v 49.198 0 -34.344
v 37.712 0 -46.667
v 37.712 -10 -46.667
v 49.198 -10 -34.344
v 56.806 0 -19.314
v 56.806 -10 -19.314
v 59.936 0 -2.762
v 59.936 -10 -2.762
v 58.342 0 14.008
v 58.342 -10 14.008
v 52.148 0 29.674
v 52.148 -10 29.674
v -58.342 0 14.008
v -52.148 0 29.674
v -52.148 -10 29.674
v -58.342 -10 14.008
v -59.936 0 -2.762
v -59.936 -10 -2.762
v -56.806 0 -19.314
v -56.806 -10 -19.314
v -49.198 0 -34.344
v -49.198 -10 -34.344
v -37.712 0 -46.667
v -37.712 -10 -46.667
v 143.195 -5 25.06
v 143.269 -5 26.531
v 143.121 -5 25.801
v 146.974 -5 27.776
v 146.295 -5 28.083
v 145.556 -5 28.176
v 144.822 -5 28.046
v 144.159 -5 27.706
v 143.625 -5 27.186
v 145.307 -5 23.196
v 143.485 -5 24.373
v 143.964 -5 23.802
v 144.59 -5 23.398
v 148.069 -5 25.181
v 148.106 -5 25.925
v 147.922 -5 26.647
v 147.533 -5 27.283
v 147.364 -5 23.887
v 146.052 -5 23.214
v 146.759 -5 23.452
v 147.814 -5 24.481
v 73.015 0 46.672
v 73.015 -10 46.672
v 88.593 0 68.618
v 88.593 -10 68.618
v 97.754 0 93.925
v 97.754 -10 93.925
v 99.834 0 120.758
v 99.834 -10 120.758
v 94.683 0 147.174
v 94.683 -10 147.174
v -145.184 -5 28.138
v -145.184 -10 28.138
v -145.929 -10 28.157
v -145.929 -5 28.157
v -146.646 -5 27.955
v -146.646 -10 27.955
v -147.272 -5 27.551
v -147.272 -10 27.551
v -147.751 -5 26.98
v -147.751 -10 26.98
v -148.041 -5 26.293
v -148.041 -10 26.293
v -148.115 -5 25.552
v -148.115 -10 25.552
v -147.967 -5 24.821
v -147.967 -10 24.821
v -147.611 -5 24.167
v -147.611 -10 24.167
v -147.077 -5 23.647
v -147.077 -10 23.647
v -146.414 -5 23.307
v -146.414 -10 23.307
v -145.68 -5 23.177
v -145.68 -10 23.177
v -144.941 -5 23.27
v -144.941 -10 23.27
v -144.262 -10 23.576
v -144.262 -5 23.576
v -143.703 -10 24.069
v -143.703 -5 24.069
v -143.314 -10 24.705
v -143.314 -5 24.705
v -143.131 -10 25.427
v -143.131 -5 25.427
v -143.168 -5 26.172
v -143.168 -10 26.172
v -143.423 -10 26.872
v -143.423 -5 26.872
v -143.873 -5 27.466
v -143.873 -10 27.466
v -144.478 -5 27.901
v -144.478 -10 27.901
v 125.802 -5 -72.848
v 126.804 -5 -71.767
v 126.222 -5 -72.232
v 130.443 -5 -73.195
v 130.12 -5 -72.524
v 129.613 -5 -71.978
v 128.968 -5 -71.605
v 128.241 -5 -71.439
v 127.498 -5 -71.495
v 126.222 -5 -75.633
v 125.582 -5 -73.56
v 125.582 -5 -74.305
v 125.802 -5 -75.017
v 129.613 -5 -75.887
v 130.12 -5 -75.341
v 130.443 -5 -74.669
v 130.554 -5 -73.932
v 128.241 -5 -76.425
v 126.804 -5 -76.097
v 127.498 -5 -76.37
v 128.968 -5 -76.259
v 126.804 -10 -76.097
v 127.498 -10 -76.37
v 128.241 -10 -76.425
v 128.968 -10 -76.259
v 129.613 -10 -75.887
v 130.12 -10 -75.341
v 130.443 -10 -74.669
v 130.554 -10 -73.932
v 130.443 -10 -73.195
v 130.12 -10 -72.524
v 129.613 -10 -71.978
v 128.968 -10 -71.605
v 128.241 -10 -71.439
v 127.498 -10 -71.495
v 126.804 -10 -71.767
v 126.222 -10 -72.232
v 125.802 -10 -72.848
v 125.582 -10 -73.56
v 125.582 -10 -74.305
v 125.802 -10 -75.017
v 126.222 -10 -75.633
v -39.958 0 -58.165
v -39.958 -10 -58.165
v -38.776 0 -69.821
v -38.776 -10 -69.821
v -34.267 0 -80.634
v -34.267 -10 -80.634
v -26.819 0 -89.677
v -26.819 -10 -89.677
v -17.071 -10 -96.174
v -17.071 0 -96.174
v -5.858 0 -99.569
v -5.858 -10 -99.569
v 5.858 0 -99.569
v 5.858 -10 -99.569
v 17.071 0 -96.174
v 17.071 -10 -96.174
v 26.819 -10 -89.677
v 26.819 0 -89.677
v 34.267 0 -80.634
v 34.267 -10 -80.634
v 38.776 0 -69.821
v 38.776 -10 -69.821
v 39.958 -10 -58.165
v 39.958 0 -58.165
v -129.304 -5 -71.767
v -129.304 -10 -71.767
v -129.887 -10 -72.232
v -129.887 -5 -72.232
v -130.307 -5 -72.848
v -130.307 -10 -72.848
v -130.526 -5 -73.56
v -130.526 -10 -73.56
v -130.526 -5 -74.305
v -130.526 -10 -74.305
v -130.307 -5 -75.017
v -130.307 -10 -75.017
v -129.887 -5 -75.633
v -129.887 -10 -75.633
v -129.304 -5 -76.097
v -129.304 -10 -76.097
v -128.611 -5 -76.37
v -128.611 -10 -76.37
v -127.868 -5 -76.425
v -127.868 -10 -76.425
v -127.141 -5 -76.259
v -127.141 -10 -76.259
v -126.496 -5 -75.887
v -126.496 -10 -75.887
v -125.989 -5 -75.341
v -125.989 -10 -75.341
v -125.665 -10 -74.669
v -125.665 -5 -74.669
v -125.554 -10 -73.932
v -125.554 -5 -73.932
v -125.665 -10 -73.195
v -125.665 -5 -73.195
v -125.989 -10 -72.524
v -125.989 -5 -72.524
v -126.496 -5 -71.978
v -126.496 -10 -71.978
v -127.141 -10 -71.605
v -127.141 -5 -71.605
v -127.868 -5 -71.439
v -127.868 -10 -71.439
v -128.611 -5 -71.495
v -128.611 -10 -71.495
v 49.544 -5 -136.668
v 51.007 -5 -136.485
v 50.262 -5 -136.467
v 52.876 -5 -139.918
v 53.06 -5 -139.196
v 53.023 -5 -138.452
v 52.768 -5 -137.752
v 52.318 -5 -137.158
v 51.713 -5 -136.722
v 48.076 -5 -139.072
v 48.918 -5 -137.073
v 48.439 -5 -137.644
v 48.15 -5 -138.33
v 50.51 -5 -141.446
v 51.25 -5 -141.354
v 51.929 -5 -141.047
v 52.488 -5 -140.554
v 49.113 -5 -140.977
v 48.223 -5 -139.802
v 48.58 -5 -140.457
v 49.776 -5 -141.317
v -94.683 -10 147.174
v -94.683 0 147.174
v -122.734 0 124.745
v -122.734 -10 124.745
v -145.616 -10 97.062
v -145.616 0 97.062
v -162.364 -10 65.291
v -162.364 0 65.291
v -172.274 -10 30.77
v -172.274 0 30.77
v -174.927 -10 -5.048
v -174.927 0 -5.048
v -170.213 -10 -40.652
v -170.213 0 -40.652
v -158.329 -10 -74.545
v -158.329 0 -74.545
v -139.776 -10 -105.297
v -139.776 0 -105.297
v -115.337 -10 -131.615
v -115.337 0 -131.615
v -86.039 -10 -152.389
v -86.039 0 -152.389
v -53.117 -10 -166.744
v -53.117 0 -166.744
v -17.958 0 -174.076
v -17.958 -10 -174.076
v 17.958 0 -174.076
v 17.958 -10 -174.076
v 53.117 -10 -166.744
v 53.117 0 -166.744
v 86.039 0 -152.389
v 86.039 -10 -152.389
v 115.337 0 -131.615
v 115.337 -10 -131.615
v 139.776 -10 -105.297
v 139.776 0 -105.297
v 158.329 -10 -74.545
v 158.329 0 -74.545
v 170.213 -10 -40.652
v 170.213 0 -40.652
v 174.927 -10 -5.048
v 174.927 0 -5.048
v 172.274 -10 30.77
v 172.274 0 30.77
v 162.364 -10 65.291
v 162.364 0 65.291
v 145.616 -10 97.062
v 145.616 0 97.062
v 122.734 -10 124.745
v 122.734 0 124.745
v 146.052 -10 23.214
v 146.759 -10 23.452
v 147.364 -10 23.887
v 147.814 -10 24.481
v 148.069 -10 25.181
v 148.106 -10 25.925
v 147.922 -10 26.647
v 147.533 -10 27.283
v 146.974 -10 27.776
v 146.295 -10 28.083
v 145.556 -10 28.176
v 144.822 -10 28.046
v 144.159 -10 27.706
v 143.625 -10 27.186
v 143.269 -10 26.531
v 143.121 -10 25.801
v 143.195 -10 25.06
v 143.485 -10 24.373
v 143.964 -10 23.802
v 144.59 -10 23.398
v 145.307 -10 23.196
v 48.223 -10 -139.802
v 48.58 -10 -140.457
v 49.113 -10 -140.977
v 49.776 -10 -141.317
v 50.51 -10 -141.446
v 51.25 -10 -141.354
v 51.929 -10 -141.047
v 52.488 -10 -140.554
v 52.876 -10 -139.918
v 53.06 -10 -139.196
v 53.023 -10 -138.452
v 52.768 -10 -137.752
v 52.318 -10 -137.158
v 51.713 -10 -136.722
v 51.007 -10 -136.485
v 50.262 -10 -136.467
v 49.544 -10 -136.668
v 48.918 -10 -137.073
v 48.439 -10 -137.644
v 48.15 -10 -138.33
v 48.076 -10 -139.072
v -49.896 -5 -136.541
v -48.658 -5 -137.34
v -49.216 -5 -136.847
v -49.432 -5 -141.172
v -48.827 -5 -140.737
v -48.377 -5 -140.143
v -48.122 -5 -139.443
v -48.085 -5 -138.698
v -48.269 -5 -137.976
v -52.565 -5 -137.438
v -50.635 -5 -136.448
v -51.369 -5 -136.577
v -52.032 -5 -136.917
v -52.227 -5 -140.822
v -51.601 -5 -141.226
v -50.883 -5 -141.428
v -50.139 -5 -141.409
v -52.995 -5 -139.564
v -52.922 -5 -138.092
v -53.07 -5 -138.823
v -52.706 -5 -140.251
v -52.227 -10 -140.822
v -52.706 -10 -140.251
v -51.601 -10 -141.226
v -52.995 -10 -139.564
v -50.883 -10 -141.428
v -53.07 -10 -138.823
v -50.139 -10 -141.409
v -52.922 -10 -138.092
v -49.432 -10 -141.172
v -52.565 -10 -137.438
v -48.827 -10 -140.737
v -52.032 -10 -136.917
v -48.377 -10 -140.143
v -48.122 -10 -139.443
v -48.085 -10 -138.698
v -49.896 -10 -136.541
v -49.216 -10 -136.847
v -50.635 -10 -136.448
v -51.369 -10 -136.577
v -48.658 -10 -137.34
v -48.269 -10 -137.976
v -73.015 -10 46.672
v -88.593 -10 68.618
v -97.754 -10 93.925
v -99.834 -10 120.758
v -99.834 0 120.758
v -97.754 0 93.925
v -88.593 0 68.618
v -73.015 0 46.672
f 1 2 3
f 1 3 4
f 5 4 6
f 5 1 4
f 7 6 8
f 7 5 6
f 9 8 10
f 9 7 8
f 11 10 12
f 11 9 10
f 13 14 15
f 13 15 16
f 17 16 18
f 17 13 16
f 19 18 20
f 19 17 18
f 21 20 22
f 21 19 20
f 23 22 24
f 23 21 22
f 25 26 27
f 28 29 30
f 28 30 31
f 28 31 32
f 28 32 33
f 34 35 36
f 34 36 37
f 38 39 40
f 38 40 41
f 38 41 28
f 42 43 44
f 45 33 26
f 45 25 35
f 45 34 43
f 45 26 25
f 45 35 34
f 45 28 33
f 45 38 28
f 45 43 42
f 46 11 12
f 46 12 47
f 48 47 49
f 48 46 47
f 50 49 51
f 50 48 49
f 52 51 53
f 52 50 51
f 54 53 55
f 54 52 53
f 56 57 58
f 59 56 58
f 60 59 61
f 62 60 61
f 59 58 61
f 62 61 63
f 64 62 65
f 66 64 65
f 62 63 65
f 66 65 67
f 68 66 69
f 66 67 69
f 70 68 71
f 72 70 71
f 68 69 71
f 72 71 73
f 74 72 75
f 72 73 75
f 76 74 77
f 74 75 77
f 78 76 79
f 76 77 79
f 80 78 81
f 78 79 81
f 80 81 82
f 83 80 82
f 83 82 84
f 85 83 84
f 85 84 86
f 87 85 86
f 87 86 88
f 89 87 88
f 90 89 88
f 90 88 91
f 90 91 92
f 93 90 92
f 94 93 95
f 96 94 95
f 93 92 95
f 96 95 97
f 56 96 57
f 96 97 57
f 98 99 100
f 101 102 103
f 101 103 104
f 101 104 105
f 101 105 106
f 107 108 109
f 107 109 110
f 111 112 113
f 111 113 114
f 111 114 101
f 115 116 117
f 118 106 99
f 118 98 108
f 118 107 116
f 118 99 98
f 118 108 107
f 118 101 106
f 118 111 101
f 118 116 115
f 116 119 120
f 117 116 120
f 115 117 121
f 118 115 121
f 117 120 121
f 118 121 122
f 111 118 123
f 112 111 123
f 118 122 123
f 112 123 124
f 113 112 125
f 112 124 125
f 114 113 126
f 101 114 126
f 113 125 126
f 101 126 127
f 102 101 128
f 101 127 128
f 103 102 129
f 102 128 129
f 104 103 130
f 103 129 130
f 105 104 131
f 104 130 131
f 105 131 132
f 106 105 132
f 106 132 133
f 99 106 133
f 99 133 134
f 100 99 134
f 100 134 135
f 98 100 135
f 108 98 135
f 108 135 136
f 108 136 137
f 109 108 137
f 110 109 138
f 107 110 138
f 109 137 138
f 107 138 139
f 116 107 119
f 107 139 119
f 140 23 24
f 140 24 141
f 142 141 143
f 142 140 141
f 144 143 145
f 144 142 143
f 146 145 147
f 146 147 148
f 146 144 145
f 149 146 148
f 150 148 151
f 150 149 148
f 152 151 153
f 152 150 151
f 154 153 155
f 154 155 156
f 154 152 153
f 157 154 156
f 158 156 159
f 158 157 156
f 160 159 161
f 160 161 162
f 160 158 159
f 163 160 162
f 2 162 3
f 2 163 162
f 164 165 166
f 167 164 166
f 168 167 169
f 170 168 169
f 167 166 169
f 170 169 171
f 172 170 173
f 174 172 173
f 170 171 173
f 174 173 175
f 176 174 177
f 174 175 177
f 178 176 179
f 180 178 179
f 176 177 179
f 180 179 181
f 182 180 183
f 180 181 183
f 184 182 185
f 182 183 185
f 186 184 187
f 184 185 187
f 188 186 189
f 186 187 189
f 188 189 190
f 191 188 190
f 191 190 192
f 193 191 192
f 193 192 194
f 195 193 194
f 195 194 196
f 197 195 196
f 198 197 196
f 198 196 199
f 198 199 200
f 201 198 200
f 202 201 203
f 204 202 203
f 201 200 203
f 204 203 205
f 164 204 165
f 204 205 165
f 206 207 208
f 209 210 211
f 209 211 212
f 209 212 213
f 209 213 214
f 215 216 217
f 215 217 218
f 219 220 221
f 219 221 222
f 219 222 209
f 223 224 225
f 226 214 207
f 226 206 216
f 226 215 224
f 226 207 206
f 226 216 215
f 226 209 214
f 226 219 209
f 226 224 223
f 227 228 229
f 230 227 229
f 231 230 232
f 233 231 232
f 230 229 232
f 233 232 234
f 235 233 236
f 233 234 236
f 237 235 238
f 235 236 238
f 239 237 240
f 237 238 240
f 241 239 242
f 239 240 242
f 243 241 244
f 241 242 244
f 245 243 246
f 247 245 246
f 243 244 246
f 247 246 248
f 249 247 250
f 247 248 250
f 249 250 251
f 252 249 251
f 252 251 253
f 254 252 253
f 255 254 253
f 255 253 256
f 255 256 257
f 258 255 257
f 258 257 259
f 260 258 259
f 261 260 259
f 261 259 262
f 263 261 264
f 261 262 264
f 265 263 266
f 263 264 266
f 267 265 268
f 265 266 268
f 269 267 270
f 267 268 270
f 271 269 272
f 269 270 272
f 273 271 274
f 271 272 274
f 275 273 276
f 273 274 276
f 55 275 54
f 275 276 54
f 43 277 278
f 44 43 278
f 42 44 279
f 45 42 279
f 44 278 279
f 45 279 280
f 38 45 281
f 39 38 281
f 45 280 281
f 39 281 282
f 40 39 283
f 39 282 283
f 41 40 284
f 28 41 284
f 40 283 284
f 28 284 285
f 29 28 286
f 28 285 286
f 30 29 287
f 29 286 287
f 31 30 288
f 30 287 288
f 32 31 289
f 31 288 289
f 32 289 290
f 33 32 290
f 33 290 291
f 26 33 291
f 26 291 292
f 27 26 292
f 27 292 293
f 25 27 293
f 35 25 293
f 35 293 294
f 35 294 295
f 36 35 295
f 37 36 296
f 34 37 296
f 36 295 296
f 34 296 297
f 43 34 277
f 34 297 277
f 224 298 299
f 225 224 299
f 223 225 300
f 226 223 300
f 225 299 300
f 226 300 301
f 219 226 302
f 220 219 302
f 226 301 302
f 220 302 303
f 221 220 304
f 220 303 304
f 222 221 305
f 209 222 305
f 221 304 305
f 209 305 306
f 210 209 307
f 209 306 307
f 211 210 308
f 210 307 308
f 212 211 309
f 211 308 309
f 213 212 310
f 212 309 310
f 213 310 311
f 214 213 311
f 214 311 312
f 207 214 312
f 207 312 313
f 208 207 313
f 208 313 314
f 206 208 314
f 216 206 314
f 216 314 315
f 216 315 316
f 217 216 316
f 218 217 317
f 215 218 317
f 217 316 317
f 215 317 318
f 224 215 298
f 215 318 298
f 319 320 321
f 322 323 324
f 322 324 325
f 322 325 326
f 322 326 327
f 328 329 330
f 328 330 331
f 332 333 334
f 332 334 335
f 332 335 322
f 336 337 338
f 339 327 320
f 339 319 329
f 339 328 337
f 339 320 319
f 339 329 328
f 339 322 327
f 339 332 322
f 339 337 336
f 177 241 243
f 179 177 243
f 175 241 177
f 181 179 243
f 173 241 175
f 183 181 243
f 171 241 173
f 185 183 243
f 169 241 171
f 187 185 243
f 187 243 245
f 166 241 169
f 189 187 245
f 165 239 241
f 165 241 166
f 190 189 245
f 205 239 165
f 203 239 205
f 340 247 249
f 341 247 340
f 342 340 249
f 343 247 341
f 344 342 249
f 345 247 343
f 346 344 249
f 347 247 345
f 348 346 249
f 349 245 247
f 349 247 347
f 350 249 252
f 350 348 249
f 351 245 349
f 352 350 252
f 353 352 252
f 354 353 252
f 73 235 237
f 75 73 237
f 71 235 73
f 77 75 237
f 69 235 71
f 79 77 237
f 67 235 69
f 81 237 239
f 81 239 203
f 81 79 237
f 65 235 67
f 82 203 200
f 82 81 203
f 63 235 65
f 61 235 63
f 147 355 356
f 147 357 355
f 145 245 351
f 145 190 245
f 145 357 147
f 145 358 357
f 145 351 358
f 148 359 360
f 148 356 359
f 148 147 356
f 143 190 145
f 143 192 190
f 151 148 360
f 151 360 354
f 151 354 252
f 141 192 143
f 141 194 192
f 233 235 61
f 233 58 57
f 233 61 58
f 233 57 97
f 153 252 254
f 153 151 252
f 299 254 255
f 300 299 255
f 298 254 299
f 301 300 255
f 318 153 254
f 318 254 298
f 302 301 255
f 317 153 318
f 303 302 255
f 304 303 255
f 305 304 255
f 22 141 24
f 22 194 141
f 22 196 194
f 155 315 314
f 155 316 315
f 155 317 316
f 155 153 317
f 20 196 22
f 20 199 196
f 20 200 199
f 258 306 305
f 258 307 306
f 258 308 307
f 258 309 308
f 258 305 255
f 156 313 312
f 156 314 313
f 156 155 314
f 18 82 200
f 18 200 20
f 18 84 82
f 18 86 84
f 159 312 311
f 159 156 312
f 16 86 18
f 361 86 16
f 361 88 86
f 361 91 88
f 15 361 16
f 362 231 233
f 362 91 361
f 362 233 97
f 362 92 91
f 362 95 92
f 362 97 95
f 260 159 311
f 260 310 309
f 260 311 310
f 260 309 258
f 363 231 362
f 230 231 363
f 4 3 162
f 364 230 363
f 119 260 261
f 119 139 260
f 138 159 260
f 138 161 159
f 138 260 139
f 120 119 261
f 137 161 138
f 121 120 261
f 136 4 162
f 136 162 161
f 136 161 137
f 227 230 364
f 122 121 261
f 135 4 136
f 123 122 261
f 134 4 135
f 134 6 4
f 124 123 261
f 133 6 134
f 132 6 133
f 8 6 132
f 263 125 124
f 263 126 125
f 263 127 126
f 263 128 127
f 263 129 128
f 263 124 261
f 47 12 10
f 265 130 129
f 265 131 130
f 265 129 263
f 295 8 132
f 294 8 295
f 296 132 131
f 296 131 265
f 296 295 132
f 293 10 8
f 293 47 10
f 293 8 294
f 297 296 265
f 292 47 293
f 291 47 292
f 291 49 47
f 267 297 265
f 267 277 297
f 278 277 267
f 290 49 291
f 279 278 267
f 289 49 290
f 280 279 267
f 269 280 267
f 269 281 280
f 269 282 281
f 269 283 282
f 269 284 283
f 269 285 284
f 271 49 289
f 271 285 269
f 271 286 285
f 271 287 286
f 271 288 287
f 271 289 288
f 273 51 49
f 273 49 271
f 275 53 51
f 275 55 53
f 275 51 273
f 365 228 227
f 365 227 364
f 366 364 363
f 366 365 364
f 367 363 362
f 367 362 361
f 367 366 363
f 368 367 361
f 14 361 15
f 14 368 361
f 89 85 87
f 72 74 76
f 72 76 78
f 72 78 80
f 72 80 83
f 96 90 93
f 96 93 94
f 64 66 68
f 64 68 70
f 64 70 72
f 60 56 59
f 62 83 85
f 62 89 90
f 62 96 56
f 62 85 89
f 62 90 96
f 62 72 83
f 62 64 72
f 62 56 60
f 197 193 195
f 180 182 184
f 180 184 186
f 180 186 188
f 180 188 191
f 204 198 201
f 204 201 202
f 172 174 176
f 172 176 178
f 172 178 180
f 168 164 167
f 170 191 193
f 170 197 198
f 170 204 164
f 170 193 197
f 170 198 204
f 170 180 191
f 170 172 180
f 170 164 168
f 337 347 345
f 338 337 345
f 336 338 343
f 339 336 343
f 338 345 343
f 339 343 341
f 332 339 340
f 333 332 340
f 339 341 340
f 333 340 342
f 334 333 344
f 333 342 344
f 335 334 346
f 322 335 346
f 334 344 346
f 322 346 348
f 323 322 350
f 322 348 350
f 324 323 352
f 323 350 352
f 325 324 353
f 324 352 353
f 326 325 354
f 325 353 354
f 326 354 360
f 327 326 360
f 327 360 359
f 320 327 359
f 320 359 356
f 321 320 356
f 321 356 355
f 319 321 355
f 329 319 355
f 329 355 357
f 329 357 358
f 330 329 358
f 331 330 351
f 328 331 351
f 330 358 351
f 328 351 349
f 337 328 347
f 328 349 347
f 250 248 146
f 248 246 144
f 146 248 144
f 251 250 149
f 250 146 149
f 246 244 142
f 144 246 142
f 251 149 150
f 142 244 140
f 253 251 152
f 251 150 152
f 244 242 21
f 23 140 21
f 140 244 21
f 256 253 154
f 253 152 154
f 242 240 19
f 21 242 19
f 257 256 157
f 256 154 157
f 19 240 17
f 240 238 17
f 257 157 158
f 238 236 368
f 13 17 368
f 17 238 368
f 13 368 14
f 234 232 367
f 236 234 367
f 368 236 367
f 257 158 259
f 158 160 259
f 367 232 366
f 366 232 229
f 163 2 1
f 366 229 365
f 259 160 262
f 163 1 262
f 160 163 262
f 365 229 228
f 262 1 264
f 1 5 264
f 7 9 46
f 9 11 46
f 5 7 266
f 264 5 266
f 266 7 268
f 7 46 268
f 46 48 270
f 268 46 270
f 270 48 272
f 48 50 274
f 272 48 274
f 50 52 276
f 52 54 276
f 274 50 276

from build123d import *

# Parameters (mm, degrees)
PAD_DEPTH          = 10
SKETCH001_R        = 2.5
POCKET_DEPTH       = 5
POLARPATTERN_COUNT = 9


with BuildPart() as part:
    # Sketch → Pad (new body)
    with BuildSketch(Plane.XZ):
        with BuildLine():
            ThreePointArc((-94.682835, 147.173913), (0, -175), (94.682835, 147.173913))
            ThreePointArc((52.148431, 29.673913), (94.028813, 80.962046), (94.682835, 147.173913))
            ThreePointArc((37.712362, -46.666667), (58.955166, -11.148473), (52.148431, 29.673913))
            ThreePointArc((-37.712362, -46.666667), (0, -100), (37.712362, -46.666667))
            ThreePointArc((-52.148431, 29.673913), (-58.955166, -11.148473), (-37.712362, -46.666667))
            ThreePointArc((-94.682835, 147.173913), (-94.028813, 80.962046), (-52.148431, 29.673913))
        make_face()
    extrude(amount=PAD_DEPTH)

    # Sketch001 (on Face8 of Pad) → Pocket (cut)
    with BuildSketch(Plane.XZ.offset(10)):
        with Locations((0, 147.864497)):
            Circle(SKETCH001_R)
    pocket = extrude(amount=-POCKET_DEPTH, mode=Mode.SUBTRACT)

    # PolarPattern: Pocket ×9 about axis
    polarpattern_axis = Axis((0, -10, 0), (0, -1, 0))
    for i in range(1, POLARPATTERN_COUNT):
        add(pocket.rotate(polarpattern_axis, i * 360 / POLARPATTERN_COUNT), mode=Mode.SUBTRACT)


solid = part.part
